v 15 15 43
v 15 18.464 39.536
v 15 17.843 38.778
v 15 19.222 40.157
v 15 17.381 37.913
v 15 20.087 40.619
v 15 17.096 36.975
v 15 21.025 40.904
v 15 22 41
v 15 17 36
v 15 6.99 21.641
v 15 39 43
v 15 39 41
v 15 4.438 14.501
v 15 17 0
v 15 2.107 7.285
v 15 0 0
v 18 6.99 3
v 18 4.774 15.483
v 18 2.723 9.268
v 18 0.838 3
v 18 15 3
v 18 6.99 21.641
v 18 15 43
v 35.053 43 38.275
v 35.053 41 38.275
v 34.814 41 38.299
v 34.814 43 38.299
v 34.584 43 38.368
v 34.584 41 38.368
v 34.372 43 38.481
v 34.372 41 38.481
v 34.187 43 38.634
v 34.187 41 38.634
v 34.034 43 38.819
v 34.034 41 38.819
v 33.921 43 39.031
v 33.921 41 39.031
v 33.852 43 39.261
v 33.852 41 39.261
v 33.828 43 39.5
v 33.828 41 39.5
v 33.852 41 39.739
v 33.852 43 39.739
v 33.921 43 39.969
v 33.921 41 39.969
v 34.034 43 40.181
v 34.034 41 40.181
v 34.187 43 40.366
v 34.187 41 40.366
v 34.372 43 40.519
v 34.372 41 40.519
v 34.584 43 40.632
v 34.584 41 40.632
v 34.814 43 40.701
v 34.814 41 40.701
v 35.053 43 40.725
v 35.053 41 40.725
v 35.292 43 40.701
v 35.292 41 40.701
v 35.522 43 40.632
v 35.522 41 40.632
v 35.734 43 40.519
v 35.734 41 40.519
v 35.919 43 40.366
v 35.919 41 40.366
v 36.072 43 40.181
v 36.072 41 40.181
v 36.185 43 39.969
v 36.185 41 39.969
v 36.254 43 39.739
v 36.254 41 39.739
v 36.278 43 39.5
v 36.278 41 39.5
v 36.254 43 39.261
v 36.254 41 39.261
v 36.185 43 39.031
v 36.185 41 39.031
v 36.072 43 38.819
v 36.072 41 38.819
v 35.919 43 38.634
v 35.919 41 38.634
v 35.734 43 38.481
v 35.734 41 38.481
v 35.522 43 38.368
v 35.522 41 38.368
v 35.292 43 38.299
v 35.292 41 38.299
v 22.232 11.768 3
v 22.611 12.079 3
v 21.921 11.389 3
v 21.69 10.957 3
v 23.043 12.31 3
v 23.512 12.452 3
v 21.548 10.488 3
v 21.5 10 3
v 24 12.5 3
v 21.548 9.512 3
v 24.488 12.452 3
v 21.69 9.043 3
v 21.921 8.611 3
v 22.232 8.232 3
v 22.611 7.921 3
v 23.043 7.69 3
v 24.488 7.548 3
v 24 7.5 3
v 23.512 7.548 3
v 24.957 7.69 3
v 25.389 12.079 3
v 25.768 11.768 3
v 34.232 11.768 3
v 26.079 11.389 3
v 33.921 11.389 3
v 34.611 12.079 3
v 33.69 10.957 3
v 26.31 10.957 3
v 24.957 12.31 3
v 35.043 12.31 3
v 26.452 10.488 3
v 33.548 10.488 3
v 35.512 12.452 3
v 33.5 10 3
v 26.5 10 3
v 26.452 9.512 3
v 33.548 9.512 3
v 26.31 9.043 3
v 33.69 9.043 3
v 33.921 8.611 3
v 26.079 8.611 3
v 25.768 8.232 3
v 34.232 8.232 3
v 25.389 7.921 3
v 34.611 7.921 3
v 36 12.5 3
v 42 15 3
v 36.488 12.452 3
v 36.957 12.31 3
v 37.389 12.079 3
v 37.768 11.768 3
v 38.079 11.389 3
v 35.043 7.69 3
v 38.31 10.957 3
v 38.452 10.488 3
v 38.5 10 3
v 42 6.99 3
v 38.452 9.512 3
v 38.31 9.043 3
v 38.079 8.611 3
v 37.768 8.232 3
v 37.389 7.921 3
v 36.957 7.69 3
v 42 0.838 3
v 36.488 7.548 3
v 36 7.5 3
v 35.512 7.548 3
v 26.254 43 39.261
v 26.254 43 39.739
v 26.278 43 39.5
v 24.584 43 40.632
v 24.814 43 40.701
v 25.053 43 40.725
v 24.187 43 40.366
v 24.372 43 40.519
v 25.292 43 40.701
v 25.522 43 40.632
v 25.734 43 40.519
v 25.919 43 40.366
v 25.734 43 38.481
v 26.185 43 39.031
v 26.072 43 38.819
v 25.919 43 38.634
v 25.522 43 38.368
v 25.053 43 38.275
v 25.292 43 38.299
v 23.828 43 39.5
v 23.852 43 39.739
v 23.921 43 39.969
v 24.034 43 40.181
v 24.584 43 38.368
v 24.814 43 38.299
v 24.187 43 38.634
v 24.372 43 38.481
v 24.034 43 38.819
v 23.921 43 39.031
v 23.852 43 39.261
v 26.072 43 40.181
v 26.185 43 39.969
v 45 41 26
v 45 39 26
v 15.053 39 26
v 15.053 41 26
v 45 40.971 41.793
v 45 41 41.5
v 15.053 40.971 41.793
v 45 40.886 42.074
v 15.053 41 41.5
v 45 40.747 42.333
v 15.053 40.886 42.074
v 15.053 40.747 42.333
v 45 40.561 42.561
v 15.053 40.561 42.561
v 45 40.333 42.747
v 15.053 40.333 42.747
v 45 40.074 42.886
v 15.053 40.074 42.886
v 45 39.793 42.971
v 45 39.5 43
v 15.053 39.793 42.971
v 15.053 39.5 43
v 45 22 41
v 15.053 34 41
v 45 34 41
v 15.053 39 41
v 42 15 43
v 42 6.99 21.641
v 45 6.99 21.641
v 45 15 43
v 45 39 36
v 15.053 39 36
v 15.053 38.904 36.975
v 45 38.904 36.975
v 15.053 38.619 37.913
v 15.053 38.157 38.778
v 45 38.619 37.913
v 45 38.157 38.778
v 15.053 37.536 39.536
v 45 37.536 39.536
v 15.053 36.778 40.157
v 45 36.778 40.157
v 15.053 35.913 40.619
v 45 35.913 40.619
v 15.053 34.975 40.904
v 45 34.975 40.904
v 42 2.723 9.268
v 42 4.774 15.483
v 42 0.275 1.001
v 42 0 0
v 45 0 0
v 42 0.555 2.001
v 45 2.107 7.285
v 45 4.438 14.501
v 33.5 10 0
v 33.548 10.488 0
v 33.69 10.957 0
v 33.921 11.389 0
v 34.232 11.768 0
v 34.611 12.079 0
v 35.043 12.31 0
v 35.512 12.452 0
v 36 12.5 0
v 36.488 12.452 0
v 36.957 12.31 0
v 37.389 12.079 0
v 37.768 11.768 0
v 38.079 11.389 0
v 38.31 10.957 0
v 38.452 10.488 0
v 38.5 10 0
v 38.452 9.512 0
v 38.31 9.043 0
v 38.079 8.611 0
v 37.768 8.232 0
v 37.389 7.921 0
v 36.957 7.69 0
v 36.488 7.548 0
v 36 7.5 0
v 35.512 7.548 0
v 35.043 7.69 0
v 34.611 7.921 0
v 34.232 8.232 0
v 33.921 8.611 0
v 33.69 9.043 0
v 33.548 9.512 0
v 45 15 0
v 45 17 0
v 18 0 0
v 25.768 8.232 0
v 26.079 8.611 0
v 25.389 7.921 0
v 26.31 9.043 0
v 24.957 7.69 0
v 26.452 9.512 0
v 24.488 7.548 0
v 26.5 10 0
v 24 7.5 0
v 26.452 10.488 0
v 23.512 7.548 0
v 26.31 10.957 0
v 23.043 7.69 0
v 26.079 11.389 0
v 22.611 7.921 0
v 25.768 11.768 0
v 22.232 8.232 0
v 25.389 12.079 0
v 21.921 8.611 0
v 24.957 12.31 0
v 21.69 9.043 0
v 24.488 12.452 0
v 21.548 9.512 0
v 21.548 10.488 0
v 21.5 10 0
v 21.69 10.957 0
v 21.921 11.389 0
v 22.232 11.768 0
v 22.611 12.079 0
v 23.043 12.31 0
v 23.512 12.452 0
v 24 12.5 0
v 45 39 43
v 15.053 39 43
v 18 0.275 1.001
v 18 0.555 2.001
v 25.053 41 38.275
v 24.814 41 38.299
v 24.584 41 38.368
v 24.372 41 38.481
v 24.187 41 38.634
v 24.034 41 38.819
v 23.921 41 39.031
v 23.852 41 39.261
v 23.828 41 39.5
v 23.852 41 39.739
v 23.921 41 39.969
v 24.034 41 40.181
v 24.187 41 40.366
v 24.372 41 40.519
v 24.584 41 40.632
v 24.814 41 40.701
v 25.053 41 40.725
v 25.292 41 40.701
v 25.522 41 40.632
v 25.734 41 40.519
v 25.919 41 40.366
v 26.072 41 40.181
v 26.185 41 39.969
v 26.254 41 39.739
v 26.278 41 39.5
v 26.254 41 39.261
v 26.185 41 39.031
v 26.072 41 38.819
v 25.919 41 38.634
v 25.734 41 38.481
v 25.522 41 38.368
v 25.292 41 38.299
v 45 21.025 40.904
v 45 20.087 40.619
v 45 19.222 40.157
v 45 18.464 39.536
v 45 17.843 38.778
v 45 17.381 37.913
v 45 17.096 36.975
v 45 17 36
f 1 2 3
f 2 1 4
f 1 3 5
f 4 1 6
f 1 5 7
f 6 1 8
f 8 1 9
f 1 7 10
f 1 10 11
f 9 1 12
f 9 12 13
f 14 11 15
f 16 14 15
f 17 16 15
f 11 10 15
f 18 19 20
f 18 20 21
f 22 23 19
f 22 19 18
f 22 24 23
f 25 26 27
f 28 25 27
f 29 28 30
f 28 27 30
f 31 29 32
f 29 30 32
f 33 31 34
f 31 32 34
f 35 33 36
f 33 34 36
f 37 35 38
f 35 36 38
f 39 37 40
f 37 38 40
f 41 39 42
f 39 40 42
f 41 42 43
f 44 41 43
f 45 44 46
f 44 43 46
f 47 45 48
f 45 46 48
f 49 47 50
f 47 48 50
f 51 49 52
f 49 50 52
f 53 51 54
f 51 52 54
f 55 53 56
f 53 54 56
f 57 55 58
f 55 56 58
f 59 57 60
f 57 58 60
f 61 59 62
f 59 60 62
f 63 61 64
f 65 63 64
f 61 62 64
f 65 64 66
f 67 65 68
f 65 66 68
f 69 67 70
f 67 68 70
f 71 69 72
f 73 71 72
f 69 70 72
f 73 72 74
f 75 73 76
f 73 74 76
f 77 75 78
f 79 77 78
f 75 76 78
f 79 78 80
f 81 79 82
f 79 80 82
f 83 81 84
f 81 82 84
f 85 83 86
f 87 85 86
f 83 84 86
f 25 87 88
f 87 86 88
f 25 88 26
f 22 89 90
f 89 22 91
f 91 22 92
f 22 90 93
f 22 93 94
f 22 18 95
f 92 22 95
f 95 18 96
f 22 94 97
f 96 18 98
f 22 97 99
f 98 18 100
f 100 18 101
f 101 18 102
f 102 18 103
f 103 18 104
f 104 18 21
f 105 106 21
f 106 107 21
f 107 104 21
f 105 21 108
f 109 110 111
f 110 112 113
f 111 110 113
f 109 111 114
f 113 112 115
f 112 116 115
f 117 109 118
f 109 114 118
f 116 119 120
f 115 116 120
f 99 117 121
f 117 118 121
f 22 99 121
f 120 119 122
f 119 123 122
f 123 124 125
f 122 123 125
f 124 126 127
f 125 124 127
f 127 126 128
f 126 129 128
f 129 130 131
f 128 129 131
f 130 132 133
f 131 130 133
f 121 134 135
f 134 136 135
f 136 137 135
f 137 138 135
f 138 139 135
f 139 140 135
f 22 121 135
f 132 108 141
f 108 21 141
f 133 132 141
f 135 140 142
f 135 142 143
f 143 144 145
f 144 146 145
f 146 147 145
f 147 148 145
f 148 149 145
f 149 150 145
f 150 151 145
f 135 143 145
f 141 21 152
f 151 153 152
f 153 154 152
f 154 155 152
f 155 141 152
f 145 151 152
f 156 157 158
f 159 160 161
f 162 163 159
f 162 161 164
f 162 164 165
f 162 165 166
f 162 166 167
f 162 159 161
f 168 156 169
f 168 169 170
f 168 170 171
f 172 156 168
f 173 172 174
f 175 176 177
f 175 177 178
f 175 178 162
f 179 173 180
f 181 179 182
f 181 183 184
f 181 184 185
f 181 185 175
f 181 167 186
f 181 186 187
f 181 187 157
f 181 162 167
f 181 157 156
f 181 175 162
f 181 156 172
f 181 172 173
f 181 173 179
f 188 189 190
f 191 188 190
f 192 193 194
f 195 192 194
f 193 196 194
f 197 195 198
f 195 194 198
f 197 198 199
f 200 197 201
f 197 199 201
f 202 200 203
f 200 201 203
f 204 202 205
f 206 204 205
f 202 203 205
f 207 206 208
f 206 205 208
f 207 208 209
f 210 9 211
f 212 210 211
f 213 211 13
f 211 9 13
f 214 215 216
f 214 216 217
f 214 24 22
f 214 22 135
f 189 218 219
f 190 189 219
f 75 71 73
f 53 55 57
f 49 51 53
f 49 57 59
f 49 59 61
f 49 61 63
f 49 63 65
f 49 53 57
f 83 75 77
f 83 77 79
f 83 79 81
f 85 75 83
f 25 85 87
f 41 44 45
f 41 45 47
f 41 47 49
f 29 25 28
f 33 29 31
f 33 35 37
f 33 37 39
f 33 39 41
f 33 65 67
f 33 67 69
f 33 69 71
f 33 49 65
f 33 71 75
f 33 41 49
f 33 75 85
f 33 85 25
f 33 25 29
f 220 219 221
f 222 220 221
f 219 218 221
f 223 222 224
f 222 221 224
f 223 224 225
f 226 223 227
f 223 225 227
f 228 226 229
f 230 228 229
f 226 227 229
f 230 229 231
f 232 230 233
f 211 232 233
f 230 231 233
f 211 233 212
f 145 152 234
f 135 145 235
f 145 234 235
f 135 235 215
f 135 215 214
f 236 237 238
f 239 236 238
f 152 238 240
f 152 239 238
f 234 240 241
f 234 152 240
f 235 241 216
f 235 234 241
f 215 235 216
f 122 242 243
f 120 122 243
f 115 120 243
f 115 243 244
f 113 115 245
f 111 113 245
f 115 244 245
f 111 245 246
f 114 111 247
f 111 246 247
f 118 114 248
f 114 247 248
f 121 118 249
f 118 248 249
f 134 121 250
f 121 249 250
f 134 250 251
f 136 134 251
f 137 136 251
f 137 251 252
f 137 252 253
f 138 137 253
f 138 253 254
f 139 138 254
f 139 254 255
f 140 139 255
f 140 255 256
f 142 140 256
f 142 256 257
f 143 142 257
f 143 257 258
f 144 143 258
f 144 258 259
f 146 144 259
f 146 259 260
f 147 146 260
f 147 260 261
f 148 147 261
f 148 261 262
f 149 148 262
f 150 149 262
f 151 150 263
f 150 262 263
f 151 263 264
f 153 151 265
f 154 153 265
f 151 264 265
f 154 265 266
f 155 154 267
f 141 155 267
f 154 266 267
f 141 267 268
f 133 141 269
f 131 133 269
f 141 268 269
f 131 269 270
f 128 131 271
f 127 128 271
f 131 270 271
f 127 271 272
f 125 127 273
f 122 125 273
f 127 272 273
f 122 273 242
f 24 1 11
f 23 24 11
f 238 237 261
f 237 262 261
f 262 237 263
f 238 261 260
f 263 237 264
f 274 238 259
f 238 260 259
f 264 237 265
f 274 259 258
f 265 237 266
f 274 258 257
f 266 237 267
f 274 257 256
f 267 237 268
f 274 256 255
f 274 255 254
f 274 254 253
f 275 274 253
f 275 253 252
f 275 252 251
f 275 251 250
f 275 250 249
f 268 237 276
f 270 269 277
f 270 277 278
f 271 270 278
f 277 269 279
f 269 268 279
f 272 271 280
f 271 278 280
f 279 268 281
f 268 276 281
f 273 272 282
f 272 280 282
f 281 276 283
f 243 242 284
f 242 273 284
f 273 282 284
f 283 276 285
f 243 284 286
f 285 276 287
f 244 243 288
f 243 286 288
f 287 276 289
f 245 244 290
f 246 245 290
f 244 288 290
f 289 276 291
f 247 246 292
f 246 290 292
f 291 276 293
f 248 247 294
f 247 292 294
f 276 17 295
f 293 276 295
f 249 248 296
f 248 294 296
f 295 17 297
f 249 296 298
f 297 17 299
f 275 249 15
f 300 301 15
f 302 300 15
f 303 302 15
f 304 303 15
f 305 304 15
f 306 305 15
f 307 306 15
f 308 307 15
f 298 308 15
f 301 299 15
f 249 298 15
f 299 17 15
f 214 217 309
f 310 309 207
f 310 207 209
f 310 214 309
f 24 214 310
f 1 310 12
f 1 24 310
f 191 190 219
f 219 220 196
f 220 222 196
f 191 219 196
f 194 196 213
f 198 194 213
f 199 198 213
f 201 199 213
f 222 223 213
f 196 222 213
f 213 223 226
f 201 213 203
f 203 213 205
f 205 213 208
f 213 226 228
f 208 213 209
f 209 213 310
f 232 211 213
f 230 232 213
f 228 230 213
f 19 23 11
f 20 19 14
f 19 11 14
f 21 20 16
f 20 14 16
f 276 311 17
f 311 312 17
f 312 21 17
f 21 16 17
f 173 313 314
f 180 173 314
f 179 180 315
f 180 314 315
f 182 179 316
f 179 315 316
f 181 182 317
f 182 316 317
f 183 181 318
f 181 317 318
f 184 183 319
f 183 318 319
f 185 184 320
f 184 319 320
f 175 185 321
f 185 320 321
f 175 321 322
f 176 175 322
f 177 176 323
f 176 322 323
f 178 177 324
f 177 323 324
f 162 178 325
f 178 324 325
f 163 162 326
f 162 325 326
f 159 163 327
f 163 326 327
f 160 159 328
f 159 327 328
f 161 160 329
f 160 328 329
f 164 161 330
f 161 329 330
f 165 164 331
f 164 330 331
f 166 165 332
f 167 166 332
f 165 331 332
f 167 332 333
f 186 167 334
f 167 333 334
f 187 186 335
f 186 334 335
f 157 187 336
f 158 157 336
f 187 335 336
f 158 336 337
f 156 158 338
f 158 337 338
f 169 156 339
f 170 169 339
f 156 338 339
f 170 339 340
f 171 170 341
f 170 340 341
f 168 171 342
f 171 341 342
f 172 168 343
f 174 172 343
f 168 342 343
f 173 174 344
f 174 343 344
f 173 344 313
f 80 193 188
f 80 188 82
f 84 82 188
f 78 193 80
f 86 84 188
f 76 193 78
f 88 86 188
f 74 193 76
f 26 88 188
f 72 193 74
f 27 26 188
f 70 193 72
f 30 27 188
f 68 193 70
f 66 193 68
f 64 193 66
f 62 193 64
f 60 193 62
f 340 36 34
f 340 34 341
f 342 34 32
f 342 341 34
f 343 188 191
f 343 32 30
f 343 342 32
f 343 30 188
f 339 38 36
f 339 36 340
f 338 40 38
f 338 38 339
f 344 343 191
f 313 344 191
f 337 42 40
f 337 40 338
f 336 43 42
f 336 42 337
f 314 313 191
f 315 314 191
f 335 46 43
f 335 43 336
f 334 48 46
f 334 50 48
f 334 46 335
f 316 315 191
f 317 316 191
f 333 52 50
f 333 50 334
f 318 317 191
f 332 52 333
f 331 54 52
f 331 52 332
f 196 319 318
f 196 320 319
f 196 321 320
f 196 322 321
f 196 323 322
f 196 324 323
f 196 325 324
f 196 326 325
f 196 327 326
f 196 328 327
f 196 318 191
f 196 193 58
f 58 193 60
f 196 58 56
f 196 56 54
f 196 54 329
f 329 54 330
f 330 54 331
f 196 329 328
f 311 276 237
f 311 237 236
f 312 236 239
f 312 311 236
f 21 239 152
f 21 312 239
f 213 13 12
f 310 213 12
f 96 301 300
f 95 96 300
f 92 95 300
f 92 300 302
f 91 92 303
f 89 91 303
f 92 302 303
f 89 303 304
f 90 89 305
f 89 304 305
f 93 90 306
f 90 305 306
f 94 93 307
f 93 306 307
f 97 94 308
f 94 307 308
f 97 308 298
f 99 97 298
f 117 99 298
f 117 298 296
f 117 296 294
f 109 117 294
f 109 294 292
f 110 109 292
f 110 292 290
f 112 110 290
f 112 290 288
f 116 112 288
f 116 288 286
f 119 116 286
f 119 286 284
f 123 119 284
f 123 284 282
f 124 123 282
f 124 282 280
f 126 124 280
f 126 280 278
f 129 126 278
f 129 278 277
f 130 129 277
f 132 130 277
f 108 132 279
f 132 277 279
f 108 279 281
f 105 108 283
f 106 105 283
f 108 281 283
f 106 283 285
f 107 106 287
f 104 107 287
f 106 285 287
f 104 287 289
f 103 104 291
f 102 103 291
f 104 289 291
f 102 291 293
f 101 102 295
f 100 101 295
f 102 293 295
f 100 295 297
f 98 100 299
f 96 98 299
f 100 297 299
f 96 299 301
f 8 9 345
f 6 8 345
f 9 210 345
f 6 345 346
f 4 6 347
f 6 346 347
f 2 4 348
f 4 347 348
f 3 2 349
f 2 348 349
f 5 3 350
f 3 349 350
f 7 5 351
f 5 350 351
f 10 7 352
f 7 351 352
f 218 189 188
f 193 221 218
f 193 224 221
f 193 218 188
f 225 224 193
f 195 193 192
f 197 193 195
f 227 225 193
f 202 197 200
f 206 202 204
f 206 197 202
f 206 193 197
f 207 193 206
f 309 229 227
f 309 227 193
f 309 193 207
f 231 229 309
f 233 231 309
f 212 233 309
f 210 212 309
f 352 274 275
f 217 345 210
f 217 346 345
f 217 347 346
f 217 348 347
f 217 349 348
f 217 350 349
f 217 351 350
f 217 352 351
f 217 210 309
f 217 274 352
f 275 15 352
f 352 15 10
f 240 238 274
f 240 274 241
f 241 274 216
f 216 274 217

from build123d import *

# Parameters (mm, degrees)
BOSS_EXTRUDE1_DEPTH      = 24.000000335
SKETCH2_W                = 24.000000671
SKETCH2_H                = 21.641136132
BOSS_EXTRUDE2_DEPTH      = 14.161821686
BOSS_EXTRUDE3_DEPTH      = 2.999999665
BOSS_EXTRUDE4_DEPTH      = 21.358863868
SKETCH5_W                = 27.000000671
SKETCH5_H                = 43
BOSS_EXTRUDE5_DEPTH      = 24.000001
CUT_EXTRUDE1_DEPTH       = 6.152247735
SKETCH7_W                = 24.000000671
SKETCH7_H                = 40
CUT_EXTRUDE2_DEPTH       = 8.00957395
BOSS_EXTRUDE6_START      = 3
BOSS_EXTRUDE6_DEPTH      = 3
SKETCH9_W                = 41
SKETCH9_H                = 22.000001
CUT_EXTRUDE3_DEPTH       = 66.345237915
SKETCH10_W               = 29.947000182
SKETCH10_H               = 17
BOSS_EXTRUDE7_DEPTH      = 2
F_5_0_5_DIAMETER_HOLE1_D = 5
FILLET1_R                = 1.5
FILLET2_R                = 5
SKETCH15_R               = 1.225
BOSS_EXTRUDE8_DEPTH      = 2


with BuildPart() as part:
    # Sketch1 → Boss-Extrude1 (new body)
    with BuildSketch(Plane(origin=(18, 0, 0), x_dir=(0, -1, 0), z_dir=(-1, 0, 0))):
        with BuildLine():
            Line((-0.838178314, 3), (-0.838178314, 0))
            Line((-0.838178314, 0), (0, 0))
            ThreePointArc((0, 0), (-0.41433113, 1.501329358), (-0.838178314, 3))
        make_face()
    extrude(amount=-BOSS_EXTRUDE1_DEPTH)

    # Sketch2 → Boss-Extrude2 (add)
    with BuildSketch(Plane(origin=(0, 0.838178314, 0), x_dir=(-1, 0, 0), z_dir=(0, 1, 0))):
        with Locations((-30.000000336, 10.820568066)):
            Rectangle(SKETCH2_W, SKETCH2_H)
    extrude(amount=BOSS_EXTRUDE2_DEPTH)


with BuildPart() as boss_extrude3_tool:
    # Sketch3 → Boss-Extrude3 (new body)
    with BuildSketch(Plane(origin=(42.000000335, 0, 0), x_dir=(0, 0, -1), z_dir=(1, 0, 0))):
        with BuildLine():
            Line((0, 15), (0, 0))
            ThreePointArc((0, 0), (-10.901557165, 3.244484944), (-21.641136132, 6.99042605))
            Line((-21.641136132, 6.99042605), (-43, 15))
            Line((-43, 15), (0, 15))
        make_face()
    extrude(amount=BOSS_EXTRUDE3_DEPTH)


with BuildPart() as part_1:
    add(part.part)


with BuildPart() as part_2:
    # Boss-Extrude3: joined with boss_extrude3_tool
    add(part_1.part.fuse(boss_extrude3_tool.part, tol=0.00001))

    # Sketch4 → Boss-Extrude4 (add)
    with BuildSketch(Plane.XY.offset(21.641136132)):
        Polygon((42.000000671, 15), (42.000000671, 6.99042605), (42.000000671, 0.838178314), (18, 0.838178314), (18, 6.99042605), (18, 15), align=None)
    extrude(amount=BOSS_EXTRUDE4_DEPTH)

    # Sketch5 → Boss-Extrude5 (add)
    with BuildSketch(Plane(origin=(0, 15, 0), x_dir=(-1, 0, 0), z_dir=(0, 1, 0))):
        with Locations((-31.500000336, 21.5)):
            Rectangle(SKETCH5_W, SKETCH5_H)
    extrude(amount=BOSS_EXTRUDE5_DEPTH)

    # Sketch6 → Cut-Extrude1 (cut)
    with BuildSketch(Plane.XZ.offset(-0.838178314)):
        Polygon((18, 3), (42.000000671, 3), (42.000000671, 21.641136132), (42.000000671, 43), (18, 43), align=None)
    extrude(amount=-CUT_EXTRUDE1_DEPTH, mode=Mode.SUBTRACT)

    # Sketch7 → Cut-Extrude2 (cut)
    with BuildSketch(Plane.XZ.offset(-6.99042605)):
        with Locations((30.000000336, 23)):
            Rectangle(SKETCH7_W, SKETCH7_H)
    extrude(amount=-CUT_EXTRUDE2_DEPTH, mode=Mode.SUBTRACT)

    # Sketch8 → Boss-Extrude6 (add)
    with BuildSketch(Plane.ZY.offset(-18).offset(BOSS_EXTRUDE6_START)):
        with BuildLine():
            Line((0, 39.000001), (43, 39.000001))
            Line((43, 39.000001), (43, 15))
            Line((43, 15), (21.641136132, 6.99042605))
            ThreePointArc((21.641136132, 6.99042605), (10.901557165, 3.244484944), (0, 0))
            Line((0, 0), (0, 39.000001))
        make_face()
    extrude(amount=-BOSS_EXTRUDE6_DEPTH)

    # Sketch9 → Cut-Extrude3 (cut, through all)
    with BuildSketch(Plane.ZY.offset(-15)):
        with Locations((20.5, 28.0000005)):
            Rectangle(SKETCH9_W, SKETCH9_H)
    extrude(amount=-CUT_EXTRUDE3_DEPTH, mode=Mode.SUBTRACT)

    # Sketch10 → Boss-Extrude7 (add)
    with BuildSketch(Plane(origin=(0, 39.000001, 0), x_dir=(-1, 0, 0), z_dir=(0, 1, 0))):
        with Locations((-30.02650058, 34.5)):
            Rectangle(SKETCH10_W, SKETCH10_H)
    extrude(amount=BOSS_EXTRUDE7_DEPTH)

    # Ø5.0 (5) Diameter Hole1 (through all)
    with Locations(Plane.XY.offset(3)):
        with Locations((36.000000045, 10), (23.999999955, 10)):
            Hole(F_5_0_5_DIAMETER_HOLE1_D / 2)

    # Fillet1
    fillet1_edges = [part_2.edges().sort_by_distance(p)[0] for p in [
        (30.02650058, 41.000001, 43),
    ]]
    fillet(fillet1_edges, radius=FILLET1_R)

    # Fillet2
    fillet2_edges = [part_2.edges().sort_by_distance(p)[0] for p in [
        (30.000000335, 17, 41),
        (30.02650058, 39.000001, 41),
    ]]
    fillet(fillet2_edges, radius=FILLET2_R)

    # Sketch15 → Boss-Extrude8 (add)
    with BuildSketch(Plane(origin=(0, 41.000001, 0), x_dir=(1, 0, 0), z_dir=(0, 1, 0))):
        with Locations((25.053000489, -39.5)):
            Circle(SKETCH15_R)
        with Locations((35.053000489, -39.5)):
            Circle(SKETCH15_R)
    extrude(amount=BOSS_EXTRUDE8_DEPTH)


solid = part_2.part
